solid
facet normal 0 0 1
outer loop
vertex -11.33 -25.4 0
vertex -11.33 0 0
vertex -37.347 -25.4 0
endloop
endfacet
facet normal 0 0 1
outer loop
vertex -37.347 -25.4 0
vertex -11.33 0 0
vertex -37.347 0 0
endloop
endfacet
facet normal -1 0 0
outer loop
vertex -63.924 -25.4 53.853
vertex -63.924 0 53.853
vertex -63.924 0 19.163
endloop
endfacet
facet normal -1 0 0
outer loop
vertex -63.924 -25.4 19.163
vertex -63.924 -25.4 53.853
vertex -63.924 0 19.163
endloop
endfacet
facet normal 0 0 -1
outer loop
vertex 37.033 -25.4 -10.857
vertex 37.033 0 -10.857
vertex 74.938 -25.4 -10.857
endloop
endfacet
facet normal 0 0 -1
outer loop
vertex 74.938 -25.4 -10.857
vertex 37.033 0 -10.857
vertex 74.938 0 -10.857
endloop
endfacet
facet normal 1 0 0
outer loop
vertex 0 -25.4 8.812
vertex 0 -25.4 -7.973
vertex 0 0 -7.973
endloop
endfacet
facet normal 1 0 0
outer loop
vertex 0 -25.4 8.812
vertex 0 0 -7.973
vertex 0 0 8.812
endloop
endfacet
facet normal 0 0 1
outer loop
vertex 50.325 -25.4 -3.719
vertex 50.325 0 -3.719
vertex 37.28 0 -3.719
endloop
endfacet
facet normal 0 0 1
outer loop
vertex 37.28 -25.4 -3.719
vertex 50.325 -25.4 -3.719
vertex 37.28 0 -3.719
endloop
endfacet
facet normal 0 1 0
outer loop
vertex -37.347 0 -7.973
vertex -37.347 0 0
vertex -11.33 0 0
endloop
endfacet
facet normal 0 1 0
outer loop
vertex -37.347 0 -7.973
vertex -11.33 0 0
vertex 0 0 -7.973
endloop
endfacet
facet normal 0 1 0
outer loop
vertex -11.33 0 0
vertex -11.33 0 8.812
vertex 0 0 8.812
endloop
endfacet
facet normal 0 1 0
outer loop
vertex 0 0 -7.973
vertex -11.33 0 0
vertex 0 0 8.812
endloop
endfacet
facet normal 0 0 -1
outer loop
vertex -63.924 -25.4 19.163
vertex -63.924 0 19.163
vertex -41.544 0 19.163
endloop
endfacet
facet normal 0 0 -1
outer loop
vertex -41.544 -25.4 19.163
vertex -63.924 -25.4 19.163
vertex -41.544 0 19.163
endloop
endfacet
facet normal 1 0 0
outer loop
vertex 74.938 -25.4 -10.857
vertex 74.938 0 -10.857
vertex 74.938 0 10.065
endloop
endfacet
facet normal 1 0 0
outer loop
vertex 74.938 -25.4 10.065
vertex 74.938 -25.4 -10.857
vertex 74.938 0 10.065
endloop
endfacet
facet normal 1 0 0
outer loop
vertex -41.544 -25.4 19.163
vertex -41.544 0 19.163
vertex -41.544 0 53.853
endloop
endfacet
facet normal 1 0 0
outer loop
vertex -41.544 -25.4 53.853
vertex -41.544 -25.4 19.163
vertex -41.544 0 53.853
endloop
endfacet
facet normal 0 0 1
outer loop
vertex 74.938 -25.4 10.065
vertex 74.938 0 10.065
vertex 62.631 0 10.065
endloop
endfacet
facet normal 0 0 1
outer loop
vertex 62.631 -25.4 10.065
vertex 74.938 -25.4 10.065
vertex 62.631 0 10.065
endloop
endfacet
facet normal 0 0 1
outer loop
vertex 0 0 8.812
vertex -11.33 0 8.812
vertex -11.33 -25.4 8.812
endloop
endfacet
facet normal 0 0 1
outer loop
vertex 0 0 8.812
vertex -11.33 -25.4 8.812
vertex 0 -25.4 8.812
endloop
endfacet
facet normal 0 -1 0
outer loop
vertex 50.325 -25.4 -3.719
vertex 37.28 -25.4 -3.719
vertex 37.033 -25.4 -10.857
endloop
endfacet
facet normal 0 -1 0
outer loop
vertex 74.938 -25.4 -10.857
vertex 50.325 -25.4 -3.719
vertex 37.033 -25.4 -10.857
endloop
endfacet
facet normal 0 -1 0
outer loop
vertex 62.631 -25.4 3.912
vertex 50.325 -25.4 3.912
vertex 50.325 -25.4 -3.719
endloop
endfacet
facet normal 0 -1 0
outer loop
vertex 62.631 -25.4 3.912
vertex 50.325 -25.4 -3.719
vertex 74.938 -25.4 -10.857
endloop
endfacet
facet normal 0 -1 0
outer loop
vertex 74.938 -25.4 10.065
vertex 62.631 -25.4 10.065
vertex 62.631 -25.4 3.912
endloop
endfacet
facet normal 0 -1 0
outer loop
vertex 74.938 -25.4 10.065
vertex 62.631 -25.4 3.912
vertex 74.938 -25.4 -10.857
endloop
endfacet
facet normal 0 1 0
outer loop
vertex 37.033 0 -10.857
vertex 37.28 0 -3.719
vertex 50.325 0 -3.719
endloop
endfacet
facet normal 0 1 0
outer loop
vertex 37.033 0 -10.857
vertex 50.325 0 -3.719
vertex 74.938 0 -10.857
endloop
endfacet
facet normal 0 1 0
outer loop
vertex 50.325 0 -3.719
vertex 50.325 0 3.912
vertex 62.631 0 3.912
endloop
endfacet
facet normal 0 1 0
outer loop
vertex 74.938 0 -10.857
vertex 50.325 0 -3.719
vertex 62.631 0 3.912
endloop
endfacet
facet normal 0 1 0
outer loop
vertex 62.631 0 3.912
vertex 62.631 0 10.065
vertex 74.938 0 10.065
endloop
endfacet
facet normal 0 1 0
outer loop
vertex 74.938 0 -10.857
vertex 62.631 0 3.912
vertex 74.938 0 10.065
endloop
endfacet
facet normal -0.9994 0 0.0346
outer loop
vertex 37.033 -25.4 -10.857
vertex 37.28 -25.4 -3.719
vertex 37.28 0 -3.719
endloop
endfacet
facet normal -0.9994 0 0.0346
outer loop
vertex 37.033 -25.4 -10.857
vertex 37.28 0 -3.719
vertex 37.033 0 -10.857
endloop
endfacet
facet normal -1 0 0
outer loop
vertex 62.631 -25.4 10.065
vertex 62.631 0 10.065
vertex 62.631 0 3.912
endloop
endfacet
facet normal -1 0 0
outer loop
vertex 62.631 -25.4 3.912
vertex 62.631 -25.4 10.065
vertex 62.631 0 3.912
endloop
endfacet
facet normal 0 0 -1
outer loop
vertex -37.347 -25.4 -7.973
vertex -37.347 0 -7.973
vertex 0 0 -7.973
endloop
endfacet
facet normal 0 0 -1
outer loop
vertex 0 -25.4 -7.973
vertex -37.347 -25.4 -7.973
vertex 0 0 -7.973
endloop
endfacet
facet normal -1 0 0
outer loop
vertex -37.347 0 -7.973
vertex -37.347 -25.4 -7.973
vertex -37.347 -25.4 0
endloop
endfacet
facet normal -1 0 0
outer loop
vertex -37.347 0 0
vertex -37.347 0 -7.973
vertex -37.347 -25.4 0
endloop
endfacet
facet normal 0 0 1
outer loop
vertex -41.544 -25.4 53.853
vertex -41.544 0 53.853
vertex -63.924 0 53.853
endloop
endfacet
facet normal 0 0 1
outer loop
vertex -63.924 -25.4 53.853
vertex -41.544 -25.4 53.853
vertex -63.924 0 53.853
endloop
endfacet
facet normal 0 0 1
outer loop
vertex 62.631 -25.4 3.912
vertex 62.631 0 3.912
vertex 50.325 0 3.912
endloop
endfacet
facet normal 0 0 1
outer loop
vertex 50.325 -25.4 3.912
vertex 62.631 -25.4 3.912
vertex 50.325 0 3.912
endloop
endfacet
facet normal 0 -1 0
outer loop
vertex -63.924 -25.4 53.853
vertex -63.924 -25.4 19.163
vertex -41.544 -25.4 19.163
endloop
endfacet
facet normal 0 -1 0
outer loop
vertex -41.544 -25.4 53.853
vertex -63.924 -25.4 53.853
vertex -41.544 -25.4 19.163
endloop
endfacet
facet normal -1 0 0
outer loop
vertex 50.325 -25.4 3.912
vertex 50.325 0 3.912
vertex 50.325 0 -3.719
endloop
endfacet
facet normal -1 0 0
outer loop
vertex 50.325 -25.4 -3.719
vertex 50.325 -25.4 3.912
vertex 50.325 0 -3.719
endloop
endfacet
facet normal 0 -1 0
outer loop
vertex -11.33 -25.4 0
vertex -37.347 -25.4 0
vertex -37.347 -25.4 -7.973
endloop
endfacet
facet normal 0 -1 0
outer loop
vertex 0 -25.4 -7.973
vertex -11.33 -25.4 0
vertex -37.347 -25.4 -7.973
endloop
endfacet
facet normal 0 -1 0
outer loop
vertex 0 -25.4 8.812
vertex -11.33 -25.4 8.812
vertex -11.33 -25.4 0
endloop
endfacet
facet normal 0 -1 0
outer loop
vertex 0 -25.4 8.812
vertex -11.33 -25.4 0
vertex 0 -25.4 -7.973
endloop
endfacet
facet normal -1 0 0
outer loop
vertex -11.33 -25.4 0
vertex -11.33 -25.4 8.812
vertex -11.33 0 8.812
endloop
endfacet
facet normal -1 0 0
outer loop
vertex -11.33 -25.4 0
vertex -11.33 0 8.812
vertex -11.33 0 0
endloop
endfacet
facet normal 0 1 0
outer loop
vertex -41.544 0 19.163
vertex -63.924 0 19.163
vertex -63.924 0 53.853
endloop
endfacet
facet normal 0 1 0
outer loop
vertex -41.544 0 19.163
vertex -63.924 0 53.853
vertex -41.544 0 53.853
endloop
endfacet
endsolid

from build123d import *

# Parameters (mm, degrees)
F0_W     = 11.3300876692
F0_H     = 7.9730246216
F0_H_2   = 8.8122906163
F0_W_2   = 12.3092299327
F0_W_3   = 13.7080065906
F1_DEPTH = 25.4
F3_DEPTH = 25.4
F4_W     = 10.9104551375
F4_H     = 12.0294764638
F4_H_2   = 12.3092290014
F4_W_2   = 11.469963938
F4_H_3   = 10.350946337
F5_DEPTH = 25.4
F6_DEPTH = 25.4


with BuildPart() as f1:
    # F0 (on Front) → F1 (new body)
    with BuildSketch(Plane.XZ):
        with Locations((-5.6650438346, -3.9865123108)):
            Rectangle(F0_W, F0_H)
        with Locations((-5.6650438346, 4.4061453082)):
            Rectangle(F0_W, F0_H_2)
        with Locations((-17.4847026356, -3.9865123108)):
            Rectangle(F0_W_2, F0_H)
        with Locations((-30.4933208972, -3.9865123108)):
            Rectangle(F0_W_3, F0_H)
    extrude(amount=F1_DEPTH)

    # F6 (add): a face of the model
    f6_faces = [f1.faces().sort_by_distance(p)[0] for p in [
        (-15.4071045328, -25.4, -1.8790556485),
    ]]
    extrude(f6_faces, amount=-F6_DEPTH)


with BuildPart() as f3:
    # F2 (on Front) → F3 (new body)
    with BuildSketch(Plane.XZ):
        Polygon((50.3246076405, -3.7186222617), (37.2795127332, -3.7186222617), (37.0333790779, -10.8565036207), (74.9379843473, -10.8565036207), (74.9379843473, -3.7186222617), (74.9379843473, 10.0648719817), (62.6313015819, 10.0648719817), (62.6313015819, 3.911526408), (50.3246076405, 3.911526408), align=None)
    extrude(amount=F3_DEPTH)


with BuildPart() as f5:
    # F4 (on Front) → F5 (new body)
    with BuildSketch(Plane.XZ):
        with Locations((-58.4688466042, 25.1779723912)):
            Rectangle(F4_W, F4_H)
        with Locations((-58.4688466042, 37.3473251238)):
            Rectangle(F4_W, F4_H_2)
        with Locations((-47.2786370665, 25.1779723912)):
            Rectangle(F4_W_2, F4_H)
        with Locations((-47.2786370665, 37.3473251238)):
            Rectangle(F4_W_2, F4_H_2)
        with Locations((-58.4688466042, 48.677412793)):
            Rectangle(F4_W, F4_H_3)
        with Locations((-47.2786370665, 48.677412793)):
            Rectangle(F4_W_2, F4_H_3)
    extrude(amount=F5_DEPTH)


solid = Compound([f1.part, f3.part, f5.part])
